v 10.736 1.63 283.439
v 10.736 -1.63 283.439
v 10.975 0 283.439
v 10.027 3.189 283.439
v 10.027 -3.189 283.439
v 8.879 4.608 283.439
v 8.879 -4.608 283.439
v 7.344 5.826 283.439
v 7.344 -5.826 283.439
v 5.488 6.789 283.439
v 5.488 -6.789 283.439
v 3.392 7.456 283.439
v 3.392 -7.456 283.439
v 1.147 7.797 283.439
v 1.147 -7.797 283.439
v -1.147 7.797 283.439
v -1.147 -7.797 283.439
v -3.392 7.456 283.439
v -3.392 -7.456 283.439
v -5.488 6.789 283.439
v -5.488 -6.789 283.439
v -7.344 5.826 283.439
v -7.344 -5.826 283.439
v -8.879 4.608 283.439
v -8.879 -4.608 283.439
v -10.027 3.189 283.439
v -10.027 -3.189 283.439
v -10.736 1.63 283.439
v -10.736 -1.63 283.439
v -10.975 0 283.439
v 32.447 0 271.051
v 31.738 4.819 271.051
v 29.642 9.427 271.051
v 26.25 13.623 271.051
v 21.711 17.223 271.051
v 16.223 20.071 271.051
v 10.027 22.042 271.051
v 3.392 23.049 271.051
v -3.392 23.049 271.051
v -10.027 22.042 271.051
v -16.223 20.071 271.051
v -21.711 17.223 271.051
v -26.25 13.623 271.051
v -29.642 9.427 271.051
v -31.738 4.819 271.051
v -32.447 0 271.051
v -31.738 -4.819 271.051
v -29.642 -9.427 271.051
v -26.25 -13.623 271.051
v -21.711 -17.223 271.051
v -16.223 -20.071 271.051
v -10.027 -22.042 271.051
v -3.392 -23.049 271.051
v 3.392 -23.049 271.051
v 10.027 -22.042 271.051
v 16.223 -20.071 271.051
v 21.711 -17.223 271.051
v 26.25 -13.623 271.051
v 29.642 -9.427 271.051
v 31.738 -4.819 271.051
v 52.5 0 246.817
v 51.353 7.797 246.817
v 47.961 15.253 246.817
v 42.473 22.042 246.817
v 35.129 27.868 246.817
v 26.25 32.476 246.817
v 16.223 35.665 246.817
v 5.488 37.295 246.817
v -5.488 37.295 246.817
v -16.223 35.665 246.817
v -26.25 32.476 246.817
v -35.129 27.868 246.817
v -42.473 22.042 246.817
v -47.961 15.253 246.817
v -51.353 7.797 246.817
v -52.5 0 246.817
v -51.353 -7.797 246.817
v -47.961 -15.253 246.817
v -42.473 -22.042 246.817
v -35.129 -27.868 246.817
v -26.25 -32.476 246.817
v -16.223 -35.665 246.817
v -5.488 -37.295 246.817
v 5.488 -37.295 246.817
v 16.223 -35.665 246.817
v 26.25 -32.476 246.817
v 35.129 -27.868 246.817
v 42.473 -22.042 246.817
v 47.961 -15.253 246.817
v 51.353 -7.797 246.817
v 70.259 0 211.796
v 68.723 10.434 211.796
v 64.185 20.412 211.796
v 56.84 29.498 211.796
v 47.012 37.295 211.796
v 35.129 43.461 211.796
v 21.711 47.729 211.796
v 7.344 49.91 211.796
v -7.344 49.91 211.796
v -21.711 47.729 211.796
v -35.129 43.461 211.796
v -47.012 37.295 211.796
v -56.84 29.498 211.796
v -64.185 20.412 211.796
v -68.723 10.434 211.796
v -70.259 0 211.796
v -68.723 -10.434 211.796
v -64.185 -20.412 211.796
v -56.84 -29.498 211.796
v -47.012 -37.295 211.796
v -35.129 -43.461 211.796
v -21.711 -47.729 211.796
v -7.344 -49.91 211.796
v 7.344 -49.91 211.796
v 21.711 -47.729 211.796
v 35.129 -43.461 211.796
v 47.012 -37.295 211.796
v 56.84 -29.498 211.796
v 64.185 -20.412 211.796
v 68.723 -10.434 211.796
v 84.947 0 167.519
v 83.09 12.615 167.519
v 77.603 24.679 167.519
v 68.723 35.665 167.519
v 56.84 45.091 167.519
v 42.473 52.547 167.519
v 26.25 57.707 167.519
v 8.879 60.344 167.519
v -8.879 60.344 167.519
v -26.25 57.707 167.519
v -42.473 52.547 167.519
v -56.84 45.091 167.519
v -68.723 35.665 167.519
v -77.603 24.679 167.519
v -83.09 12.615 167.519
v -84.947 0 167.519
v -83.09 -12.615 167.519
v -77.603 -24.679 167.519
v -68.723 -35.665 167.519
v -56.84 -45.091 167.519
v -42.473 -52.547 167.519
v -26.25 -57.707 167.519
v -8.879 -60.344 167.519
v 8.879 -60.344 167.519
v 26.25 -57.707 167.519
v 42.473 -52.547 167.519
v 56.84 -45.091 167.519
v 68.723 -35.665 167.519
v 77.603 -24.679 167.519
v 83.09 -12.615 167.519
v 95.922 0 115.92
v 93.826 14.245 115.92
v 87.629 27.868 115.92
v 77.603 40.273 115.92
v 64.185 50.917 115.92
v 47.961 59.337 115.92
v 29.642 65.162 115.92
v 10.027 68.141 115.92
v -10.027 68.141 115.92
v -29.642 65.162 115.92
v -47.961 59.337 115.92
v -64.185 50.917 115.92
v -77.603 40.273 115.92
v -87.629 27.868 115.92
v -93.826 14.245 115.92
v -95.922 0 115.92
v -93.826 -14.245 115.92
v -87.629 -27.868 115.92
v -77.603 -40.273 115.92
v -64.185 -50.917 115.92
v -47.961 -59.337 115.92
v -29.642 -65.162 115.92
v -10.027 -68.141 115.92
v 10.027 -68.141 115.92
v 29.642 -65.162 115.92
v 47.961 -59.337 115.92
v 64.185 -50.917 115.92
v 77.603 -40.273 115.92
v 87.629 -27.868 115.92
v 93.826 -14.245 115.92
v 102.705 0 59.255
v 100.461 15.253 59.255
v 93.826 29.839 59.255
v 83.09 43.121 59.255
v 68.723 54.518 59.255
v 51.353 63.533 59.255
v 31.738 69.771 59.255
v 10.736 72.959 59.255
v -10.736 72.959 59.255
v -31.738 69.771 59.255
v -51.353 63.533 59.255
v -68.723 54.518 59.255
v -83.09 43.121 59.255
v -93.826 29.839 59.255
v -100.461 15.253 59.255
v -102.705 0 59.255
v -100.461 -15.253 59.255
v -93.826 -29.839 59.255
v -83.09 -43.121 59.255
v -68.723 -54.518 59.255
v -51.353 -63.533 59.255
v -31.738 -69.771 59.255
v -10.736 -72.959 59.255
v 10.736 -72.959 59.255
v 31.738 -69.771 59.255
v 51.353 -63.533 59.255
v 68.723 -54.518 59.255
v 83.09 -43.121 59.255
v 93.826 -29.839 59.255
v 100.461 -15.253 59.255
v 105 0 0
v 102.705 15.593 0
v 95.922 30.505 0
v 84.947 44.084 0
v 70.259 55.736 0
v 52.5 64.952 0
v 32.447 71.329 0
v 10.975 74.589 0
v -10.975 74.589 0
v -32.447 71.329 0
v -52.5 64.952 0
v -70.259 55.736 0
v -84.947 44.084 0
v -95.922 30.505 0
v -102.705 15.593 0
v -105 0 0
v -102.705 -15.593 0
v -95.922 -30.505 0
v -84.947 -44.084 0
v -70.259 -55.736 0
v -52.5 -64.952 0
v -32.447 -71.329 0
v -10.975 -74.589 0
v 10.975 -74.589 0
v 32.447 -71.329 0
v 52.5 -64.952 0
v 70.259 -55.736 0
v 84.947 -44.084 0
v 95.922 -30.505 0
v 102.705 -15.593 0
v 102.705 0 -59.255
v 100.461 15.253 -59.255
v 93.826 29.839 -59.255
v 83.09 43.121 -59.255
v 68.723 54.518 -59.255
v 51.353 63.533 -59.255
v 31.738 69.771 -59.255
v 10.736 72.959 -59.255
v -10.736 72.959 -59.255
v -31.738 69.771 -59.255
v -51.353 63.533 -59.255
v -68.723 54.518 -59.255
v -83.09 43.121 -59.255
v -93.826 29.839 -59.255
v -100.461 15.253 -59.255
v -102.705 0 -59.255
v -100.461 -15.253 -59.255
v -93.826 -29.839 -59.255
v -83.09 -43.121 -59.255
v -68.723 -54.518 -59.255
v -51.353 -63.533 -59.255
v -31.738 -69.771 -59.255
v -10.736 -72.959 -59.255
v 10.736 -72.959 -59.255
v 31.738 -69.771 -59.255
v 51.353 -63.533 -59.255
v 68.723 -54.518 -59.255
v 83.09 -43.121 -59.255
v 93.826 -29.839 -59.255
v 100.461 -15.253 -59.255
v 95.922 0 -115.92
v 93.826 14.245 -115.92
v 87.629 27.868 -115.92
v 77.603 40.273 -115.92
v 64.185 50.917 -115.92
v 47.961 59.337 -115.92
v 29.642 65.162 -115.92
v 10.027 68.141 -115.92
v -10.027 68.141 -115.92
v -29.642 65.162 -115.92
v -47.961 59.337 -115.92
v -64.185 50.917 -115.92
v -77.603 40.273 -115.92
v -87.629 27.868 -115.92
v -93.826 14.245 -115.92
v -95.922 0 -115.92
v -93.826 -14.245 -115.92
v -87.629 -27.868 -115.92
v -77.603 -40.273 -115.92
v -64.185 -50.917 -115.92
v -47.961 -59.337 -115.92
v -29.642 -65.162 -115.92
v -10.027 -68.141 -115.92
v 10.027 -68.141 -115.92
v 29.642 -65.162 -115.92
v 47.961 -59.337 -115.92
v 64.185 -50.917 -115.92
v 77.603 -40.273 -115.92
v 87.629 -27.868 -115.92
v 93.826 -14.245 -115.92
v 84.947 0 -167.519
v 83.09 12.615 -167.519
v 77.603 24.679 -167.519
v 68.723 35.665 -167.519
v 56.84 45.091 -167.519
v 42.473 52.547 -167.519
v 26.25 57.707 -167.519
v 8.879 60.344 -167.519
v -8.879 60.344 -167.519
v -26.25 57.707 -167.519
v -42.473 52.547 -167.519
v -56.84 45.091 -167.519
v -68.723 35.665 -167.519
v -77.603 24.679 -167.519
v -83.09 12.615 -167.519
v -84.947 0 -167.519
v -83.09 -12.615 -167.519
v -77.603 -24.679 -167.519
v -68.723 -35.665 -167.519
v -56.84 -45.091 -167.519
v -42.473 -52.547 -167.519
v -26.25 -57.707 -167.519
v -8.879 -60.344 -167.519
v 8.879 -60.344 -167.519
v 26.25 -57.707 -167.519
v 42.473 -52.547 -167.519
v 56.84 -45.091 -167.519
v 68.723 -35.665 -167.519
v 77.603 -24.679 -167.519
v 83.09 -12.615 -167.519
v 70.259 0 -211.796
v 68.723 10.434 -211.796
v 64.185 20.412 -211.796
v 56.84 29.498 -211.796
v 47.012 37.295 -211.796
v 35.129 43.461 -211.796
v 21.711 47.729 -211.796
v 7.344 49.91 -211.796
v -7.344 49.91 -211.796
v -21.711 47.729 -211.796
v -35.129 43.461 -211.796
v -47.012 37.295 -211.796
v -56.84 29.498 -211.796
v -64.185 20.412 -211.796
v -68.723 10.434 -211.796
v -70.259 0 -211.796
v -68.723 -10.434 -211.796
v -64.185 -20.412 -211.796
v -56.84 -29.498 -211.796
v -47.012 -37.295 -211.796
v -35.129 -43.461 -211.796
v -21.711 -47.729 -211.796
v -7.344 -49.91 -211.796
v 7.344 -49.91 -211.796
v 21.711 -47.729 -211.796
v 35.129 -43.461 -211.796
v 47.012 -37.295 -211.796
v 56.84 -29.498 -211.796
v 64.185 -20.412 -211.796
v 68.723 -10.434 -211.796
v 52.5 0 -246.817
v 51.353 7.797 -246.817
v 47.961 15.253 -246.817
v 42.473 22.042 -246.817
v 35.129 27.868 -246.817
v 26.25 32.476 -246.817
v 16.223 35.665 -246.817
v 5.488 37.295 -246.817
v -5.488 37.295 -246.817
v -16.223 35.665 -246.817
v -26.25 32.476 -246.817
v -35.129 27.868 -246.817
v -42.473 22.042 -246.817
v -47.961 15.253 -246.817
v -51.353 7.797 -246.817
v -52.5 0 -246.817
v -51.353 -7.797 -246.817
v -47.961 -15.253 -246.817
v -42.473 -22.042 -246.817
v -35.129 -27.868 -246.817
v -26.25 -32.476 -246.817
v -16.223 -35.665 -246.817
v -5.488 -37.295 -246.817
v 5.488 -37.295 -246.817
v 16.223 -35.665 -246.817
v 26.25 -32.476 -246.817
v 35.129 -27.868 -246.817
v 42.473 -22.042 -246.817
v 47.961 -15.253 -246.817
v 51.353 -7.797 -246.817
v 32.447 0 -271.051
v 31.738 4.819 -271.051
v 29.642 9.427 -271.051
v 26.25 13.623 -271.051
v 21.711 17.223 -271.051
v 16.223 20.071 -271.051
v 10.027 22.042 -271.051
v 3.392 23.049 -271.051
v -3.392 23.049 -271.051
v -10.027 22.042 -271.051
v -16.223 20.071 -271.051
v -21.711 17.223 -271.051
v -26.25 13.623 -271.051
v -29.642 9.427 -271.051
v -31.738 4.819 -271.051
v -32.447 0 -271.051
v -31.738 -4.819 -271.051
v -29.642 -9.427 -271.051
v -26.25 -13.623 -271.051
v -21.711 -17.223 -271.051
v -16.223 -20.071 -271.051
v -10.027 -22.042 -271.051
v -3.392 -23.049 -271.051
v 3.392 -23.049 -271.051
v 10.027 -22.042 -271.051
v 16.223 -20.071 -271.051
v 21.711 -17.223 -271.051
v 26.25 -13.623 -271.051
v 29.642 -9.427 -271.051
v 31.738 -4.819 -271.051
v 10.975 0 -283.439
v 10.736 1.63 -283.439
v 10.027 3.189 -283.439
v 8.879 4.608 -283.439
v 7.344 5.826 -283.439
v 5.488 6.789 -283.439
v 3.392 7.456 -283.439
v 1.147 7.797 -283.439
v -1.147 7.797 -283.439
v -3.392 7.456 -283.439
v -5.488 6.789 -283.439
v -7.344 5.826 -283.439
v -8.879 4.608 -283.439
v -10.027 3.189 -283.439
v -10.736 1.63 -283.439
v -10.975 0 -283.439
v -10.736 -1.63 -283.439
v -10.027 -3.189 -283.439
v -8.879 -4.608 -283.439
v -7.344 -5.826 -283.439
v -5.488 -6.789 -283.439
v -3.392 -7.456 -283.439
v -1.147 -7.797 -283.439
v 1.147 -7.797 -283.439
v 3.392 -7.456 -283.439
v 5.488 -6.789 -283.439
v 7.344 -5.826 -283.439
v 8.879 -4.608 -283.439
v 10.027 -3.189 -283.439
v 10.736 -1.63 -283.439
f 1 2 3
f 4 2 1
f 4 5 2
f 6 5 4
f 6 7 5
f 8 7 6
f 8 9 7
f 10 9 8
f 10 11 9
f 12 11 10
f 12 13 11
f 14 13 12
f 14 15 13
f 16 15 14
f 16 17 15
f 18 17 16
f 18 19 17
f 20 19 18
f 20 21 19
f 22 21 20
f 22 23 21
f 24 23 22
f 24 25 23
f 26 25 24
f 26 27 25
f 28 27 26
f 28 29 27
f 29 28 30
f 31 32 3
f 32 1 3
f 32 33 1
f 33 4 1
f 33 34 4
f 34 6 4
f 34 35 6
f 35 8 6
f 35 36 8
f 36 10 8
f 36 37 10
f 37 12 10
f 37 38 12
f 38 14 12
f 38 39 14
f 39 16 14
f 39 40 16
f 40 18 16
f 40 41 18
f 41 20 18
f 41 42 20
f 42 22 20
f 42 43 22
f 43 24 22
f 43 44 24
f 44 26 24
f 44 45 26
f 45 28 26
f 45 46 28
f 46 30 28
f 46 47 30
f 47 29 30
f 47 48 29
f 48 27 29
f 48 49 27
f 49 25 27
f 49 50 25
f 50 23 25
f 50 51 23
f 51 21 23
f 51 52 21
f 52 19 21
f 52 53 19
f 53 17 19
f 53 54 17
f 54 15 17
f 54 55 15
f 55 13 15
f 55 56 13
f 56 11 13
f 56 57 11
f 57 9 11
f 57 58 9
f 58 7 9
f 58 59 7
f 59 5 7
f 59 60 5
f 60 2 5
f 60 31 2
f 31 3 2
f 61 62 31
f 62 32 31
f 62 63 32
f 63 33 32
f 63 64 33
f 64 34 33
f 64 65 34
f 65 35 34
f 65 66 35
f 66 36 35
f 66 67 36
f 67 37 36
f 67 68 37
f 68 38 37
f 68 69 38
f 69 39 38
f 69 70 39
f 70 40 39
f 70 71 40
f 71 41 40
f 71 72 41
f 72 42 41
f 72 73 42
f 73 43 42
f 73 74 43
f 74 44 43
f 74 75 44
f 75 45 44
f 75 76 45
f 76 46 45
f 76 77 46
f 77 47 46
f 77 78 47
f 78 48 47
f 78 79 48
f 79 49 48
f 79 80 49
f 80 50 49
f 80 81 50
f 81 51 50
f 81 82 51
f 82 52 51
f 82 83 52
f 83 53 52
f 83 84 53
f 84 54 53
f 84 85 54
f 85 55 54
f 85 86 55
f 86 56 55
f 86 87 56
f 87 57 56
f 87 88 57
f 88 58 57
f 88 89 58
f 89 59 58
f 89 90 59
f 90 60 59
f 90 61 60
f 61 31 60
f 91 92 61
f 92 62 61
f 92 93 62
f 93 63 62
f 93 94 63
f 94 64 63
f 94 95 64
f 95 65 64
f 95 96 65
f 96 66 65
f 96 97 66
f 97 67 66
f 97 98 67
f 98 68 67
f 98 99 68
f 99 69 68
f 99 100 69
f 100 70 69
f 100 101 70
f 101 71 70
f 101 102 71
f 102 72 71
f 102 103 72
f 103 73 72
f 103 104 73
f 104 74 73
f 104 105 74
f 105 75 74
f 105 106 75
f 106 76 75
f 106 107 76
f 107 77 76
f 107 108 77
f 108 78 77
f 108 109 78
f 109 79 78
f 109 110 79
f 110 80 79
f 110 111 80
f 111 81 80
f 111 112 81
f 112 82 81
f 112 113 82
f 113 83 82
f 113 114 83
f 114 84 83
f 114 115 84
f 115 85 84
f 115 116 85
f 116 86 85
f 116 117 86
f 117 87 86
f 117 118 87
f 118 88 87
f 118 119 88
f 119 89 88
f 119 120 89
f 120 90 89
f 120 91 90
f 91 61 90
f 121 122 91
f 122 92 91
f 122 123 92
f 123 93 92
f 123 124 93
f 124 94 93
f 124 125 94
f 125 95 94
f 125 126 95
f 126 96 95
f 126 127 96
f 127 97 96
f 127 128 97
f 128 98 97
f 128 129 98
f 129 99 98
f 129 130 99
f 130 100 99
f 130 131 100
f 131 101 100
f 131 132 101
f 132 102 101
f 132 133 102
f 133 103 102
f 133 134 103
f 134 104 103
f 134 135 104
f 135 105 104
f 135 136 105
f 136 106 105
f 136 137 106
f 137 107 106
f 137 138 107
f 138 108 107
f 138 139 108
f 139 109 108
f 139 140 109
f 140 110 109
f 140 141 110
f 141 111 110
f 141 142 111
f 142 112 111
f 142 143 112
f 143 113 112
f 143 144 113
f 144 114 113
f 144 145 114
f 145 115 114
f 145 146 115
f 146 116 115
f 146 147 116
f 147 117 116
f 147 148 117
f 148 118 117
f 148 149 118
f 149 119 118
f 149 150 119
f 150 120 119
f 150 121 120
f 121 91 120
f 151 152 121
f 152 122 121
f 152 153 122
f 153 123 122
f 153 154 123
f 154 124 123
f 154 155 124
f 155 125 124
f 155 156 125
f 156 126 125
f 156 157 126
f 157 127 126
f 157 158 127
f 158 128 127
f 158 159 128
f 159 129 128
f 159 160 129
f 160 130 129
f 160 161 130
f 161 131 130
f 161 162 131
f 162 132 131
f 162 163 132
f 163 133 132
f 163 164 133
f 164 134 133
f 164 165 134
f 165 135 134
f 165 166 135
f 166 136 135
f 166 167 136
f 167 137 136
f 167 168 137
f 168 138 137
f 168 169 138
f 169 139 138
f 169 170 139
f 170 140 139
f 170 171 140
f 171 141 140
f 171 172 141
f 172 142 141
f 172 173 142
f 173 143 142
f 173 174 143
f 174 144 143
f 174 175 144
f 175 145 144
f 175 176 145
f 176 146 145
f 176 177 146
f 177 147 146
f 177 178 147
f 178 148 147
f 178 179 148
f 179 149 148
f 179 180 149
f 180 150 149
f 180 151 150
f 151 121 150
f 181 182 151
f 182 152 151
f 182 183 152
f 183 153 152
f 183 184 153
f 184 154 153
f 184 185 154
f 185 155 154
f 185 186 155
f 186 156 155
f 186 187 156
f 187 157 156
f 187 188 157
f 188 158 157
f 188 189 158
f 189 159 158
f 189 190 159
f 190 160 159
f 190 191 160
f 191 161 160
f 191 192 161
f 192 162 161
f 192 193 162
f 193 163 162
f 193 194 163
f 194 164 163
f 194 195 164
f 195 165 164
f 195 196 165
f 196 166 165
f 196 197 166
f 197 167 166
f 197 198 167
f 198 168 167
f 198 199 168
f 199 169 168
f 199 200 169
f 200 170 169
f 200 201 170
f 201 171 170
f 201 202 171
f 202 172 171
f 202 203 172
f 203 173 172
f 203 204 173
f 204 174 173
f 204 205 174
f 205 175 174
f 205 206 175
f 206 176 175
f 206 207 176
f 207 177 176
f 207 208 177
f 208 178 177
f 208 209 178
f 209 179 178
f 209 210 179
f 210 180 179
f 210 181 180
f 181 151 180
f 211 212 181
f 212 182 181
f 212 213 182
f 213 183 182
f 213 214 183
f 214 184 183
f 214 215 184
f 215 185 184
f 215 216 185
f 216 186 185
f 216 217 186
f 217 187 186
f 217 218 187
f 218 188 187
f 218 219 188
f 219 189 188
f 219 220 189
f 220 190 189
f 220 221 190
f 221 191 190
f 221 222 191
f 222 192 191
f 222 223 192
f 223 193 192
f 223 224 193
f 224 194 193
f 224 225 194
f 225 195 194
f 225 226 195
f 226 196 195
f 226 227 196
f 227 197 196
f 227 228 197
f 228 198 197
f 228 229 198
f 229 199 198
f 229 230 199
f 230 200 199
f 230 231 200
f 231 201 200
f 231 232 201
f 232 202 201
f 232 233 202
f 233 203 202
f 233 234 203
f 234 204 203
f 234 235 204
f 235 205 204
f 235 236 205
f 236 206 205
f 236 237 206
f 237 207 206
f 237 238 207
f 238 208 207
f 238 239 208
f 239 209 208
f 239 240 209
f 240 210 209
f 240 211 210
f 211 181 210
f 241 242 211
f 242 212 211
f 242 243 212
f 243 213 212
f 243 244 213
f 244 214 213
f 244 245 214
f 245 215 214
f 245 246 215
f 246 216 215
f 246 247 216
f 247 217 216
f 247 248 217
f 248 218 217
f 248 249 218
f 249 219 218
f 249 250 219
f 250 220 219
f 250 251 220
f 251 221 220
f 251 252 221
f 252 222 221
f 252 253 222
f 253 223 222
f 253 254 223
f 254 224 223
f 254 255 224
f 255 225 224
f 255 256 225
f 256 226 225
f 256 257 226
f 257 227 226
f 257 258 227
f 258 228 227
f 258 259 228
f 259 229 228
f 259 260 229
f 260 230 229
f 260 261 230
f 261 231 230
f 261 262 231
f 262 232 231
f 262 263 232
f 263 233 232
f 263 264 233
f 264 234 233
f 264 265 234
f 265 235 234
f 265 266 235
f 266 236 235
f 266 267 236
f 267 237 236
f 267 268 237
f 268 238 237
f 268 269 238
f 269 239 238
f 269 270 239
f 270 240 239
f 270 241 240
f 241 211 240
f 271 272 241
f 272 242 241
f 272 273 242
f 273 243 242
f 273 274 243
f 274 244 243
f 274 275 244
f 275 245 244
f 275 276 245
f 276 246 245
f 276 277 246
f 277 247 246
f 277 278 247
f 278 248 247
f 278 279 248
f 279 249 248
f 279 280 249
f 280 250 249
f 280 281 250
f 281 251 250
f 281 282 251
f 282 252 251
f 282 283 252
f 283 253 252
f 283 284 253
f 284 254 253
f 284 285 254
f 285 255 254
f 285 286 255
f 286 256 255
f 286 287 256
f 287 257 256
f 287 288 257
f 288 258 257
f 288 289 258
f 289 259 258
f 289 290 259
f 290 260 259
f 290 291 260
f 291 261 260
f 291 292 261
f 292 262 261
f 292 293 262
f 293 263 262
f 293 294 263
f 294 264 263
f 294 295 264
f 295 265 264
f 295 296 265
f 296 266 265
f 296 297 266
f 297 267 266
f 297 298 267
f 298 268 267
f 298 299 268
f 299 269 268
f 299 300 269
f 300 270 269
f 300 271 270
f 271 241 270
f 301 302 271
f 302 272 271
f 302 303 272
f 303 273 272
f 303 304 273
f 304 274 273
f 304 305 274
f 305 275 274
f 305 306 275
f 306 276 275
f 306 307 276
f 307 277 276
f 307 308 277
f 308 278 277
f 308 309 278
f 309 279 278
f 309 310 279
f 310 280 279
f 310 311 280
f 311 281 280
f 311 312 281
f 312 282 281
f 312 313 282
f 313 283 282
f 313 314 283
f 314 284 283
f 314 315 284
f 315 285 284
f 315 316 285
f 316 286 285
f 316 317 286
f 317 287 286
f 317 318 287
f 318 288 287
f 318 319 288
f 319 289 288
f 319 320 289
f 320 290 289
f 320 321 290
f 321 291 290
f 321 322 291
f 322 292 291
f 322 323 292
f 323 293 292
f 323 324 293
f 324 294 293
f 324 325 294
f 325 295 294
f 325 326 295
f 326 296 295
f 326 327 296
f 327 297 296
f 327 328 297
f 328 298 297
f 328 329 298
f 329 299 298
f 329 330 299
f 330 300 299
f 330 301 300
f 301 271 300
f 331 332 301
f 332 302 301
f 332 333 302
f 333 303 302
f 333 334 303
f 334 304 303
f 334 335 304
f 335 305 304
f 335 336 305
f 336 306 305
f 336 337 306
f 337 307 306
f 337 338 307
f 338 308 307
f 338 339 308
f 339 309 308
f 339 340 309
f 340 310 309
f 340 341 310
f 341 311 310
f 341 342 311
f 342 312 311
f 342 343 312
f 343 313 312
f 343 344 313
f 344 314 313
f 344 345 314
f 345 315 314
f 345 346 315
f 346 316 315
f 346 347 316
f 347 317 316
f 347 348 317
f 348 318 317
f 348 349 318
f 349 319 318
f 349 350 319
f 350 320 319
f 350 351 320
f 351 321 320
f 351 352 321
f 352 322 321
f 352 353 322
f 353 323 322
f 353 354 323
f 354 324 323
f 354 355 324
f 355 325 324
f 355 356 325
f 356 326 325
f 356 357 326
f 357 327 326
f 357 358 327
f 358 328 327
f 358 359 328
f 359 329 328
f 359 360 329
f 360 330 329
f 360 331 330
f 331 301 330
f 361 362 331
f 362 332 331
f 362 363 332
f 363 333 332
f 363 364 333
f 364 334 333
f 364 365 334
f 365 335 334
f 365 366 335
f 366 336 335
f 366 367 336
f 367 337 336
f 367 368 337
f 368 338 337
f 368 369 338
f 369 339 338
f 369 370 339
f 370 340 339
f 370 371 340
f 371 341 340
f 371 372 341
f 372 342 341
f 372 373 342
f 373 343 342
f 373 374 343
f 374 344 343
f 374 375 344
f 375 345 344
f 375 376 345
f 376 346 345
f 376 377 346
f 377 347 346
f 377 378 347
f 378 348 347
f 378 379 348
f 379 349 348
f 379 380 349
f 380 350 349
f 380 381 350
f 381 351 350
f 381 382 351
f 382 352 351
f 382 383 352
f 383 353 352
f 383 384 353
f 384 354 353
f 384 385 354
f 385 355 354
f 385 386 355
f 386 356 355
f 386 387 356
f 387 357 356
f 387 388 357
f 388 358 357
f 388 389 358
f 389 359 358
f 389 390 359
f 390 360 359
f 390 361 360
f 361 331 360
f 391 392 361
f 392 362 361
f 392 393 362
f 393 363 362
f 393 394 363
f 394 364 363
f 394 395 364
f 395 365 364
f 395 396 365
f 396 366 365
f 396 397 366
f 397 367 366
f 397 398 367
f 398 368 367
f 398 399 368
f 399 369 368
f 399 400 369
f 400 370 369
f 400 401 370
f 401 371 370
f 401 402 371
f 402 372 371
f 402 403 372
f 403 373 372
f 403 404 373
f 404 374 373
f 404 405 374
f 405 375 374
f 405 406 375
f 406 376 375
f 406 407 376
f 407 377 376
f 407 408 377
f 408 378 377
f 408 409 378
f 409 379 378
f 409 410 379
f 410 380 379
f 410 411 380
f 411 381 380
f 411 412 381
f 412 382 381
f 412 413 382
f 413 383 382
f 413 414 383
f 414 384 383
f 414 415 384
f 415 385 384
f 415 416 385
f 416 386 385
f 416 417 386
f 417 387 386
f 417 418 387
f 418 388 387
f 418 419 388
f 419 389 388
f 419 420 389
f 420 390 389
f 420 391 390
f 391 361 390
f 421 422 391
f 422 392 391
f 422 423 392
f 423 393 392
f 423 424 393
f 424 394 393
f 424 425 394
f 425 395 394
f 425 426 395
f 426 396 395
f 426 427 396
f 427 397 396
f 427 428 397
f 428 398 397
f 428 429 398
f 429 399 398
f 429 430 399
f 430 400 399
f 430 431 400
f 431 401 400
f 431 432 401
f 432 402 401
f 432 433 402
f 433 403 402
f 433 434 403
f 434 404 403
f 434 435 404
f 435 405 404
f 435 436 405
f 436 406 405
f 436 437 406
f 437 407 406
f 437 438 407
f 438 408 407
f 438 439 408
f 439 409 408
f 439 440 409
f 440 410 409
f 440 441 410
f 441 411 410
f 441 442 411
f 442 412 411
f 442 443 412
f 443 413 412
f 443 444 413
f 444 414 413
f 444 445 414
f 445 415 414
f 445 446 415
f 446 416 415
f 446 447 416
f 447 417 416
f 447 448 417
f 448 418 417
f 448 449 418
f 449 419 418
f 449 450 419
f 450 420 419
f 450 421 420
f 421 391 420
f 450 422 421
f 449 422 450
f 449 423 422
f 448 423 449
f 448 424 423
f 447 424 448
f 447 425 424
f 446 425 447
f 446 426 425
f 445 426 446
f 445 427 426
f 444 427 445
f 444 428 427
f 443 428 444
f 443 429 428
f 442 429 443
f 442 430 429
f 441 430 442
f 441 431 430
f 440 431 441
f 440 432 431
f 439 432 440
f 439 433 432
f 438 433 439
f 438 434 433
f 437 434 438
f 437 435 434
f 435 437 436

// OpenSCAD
// Generated by SolidPython 1.0.1 on 2020-07-29 00:46:47


scale(v = [7, 5, 19]) {
	sphere(r = 15);
}
/***********************************************
*********      SolidPython code:      **********
************************************************
 
# import packages: SolidPython
from solid import *
from solid.utils import *
from itertools import chain, combinations, permutations


class Resize:

    def __init__(self, scad_file):
        self.scad_file = scad_file
        #self.scad_file = import_scad(scad_file)
        # cone/cylinder param:
        self.r1 = 0
        self.r2 = 0
        self.h = 0
        # rectangular prism param:
        self.w = 0
        self.l = 0
        # ellipse param:
        self.r = 0

    # import OpenScad code (file name corresponds to shape)


    # classify shape + parameters
    def assign(self, param1, param2, param3):
        if self.scad_file == 'cone.scad':
            self.r1 = param1
            self.r2 = param2
            self.h = param3
        elif self.scad_file == 'cylinder.scad':
            self.r1 = param1
            self.r2 = param2
            self.h = param3
        elif self.scad_file == 'rectangularPrism.scad':
            self.h = param1
            self.l = param2
            self.w = param3
        else:
            self.r = param1
            self.h = param2

    # resize parameters
    def iterate(self):
        x = range(3, 20, 2)
        i = 1
        if self.scad_file == 'cone.scad':
            tempList = list(permutations(x, 2))
            for temp in tempList:
                param1 = temp[0]
                param2 = temp[1]
                filepath = 'produced_scad_files/' + 'cone' + str(param1) + '_' + str(param2) + '_' + '.scad'
                scad_render_to_file(cylinder(h=param1, r1=param2, r2=0), filepath)

        elif self.scad_file == 'cylinder.scad':
            tempList = list(permutations(x, 3))
            for temp in tempList:
                param1 = temp[0]
                param2 = temp[1]
                filepath = 'produced_scad_files/' + 'cylinder' + str(param1) + '_' + str(param2) + '_' + '.scad'
                scad_render_to_file(cylinder(h=param1, r1=param2, r2=param2), filepath)

        elif self.scad_file == 'rectangularPrism.scad':
            tempList = list(permutations(x, 3))
            for temp in tempList:
                param1 = temp[0]
                param2 = temp[1]
                param3 = temp[2]
                filepath = 'produced_scad_files/' + 'rectangularPrism' + str(param1) + '_' + str(param2) + '_' + str(
                    param3) + '.scad'
                scad_render_to_file(cube(size=(param1, param2, param3)), filepath)

        elif self.scad_file == 'ellipse.scad':
            tempList = list(permutations(x, 4))
            for temp in tempList:
                param1 = temp[0]
                param2 = temp[1]
                param3 = temp[2]
                param4 = temp[3]
                filepath = 'produced_scad_files/' + 'ellipse' + str(param1) + '_' + str(param2) + '_' + str(param3) + '_' + str(param4) + '.scad'
                scad_render_to_file(scale([param1, param2, param3])(sphere(r=param4)), filepath)

    def render_to_scadfile(self):
        scad_render_to_file(scad, 'example.scad') 
 
************************************************/
